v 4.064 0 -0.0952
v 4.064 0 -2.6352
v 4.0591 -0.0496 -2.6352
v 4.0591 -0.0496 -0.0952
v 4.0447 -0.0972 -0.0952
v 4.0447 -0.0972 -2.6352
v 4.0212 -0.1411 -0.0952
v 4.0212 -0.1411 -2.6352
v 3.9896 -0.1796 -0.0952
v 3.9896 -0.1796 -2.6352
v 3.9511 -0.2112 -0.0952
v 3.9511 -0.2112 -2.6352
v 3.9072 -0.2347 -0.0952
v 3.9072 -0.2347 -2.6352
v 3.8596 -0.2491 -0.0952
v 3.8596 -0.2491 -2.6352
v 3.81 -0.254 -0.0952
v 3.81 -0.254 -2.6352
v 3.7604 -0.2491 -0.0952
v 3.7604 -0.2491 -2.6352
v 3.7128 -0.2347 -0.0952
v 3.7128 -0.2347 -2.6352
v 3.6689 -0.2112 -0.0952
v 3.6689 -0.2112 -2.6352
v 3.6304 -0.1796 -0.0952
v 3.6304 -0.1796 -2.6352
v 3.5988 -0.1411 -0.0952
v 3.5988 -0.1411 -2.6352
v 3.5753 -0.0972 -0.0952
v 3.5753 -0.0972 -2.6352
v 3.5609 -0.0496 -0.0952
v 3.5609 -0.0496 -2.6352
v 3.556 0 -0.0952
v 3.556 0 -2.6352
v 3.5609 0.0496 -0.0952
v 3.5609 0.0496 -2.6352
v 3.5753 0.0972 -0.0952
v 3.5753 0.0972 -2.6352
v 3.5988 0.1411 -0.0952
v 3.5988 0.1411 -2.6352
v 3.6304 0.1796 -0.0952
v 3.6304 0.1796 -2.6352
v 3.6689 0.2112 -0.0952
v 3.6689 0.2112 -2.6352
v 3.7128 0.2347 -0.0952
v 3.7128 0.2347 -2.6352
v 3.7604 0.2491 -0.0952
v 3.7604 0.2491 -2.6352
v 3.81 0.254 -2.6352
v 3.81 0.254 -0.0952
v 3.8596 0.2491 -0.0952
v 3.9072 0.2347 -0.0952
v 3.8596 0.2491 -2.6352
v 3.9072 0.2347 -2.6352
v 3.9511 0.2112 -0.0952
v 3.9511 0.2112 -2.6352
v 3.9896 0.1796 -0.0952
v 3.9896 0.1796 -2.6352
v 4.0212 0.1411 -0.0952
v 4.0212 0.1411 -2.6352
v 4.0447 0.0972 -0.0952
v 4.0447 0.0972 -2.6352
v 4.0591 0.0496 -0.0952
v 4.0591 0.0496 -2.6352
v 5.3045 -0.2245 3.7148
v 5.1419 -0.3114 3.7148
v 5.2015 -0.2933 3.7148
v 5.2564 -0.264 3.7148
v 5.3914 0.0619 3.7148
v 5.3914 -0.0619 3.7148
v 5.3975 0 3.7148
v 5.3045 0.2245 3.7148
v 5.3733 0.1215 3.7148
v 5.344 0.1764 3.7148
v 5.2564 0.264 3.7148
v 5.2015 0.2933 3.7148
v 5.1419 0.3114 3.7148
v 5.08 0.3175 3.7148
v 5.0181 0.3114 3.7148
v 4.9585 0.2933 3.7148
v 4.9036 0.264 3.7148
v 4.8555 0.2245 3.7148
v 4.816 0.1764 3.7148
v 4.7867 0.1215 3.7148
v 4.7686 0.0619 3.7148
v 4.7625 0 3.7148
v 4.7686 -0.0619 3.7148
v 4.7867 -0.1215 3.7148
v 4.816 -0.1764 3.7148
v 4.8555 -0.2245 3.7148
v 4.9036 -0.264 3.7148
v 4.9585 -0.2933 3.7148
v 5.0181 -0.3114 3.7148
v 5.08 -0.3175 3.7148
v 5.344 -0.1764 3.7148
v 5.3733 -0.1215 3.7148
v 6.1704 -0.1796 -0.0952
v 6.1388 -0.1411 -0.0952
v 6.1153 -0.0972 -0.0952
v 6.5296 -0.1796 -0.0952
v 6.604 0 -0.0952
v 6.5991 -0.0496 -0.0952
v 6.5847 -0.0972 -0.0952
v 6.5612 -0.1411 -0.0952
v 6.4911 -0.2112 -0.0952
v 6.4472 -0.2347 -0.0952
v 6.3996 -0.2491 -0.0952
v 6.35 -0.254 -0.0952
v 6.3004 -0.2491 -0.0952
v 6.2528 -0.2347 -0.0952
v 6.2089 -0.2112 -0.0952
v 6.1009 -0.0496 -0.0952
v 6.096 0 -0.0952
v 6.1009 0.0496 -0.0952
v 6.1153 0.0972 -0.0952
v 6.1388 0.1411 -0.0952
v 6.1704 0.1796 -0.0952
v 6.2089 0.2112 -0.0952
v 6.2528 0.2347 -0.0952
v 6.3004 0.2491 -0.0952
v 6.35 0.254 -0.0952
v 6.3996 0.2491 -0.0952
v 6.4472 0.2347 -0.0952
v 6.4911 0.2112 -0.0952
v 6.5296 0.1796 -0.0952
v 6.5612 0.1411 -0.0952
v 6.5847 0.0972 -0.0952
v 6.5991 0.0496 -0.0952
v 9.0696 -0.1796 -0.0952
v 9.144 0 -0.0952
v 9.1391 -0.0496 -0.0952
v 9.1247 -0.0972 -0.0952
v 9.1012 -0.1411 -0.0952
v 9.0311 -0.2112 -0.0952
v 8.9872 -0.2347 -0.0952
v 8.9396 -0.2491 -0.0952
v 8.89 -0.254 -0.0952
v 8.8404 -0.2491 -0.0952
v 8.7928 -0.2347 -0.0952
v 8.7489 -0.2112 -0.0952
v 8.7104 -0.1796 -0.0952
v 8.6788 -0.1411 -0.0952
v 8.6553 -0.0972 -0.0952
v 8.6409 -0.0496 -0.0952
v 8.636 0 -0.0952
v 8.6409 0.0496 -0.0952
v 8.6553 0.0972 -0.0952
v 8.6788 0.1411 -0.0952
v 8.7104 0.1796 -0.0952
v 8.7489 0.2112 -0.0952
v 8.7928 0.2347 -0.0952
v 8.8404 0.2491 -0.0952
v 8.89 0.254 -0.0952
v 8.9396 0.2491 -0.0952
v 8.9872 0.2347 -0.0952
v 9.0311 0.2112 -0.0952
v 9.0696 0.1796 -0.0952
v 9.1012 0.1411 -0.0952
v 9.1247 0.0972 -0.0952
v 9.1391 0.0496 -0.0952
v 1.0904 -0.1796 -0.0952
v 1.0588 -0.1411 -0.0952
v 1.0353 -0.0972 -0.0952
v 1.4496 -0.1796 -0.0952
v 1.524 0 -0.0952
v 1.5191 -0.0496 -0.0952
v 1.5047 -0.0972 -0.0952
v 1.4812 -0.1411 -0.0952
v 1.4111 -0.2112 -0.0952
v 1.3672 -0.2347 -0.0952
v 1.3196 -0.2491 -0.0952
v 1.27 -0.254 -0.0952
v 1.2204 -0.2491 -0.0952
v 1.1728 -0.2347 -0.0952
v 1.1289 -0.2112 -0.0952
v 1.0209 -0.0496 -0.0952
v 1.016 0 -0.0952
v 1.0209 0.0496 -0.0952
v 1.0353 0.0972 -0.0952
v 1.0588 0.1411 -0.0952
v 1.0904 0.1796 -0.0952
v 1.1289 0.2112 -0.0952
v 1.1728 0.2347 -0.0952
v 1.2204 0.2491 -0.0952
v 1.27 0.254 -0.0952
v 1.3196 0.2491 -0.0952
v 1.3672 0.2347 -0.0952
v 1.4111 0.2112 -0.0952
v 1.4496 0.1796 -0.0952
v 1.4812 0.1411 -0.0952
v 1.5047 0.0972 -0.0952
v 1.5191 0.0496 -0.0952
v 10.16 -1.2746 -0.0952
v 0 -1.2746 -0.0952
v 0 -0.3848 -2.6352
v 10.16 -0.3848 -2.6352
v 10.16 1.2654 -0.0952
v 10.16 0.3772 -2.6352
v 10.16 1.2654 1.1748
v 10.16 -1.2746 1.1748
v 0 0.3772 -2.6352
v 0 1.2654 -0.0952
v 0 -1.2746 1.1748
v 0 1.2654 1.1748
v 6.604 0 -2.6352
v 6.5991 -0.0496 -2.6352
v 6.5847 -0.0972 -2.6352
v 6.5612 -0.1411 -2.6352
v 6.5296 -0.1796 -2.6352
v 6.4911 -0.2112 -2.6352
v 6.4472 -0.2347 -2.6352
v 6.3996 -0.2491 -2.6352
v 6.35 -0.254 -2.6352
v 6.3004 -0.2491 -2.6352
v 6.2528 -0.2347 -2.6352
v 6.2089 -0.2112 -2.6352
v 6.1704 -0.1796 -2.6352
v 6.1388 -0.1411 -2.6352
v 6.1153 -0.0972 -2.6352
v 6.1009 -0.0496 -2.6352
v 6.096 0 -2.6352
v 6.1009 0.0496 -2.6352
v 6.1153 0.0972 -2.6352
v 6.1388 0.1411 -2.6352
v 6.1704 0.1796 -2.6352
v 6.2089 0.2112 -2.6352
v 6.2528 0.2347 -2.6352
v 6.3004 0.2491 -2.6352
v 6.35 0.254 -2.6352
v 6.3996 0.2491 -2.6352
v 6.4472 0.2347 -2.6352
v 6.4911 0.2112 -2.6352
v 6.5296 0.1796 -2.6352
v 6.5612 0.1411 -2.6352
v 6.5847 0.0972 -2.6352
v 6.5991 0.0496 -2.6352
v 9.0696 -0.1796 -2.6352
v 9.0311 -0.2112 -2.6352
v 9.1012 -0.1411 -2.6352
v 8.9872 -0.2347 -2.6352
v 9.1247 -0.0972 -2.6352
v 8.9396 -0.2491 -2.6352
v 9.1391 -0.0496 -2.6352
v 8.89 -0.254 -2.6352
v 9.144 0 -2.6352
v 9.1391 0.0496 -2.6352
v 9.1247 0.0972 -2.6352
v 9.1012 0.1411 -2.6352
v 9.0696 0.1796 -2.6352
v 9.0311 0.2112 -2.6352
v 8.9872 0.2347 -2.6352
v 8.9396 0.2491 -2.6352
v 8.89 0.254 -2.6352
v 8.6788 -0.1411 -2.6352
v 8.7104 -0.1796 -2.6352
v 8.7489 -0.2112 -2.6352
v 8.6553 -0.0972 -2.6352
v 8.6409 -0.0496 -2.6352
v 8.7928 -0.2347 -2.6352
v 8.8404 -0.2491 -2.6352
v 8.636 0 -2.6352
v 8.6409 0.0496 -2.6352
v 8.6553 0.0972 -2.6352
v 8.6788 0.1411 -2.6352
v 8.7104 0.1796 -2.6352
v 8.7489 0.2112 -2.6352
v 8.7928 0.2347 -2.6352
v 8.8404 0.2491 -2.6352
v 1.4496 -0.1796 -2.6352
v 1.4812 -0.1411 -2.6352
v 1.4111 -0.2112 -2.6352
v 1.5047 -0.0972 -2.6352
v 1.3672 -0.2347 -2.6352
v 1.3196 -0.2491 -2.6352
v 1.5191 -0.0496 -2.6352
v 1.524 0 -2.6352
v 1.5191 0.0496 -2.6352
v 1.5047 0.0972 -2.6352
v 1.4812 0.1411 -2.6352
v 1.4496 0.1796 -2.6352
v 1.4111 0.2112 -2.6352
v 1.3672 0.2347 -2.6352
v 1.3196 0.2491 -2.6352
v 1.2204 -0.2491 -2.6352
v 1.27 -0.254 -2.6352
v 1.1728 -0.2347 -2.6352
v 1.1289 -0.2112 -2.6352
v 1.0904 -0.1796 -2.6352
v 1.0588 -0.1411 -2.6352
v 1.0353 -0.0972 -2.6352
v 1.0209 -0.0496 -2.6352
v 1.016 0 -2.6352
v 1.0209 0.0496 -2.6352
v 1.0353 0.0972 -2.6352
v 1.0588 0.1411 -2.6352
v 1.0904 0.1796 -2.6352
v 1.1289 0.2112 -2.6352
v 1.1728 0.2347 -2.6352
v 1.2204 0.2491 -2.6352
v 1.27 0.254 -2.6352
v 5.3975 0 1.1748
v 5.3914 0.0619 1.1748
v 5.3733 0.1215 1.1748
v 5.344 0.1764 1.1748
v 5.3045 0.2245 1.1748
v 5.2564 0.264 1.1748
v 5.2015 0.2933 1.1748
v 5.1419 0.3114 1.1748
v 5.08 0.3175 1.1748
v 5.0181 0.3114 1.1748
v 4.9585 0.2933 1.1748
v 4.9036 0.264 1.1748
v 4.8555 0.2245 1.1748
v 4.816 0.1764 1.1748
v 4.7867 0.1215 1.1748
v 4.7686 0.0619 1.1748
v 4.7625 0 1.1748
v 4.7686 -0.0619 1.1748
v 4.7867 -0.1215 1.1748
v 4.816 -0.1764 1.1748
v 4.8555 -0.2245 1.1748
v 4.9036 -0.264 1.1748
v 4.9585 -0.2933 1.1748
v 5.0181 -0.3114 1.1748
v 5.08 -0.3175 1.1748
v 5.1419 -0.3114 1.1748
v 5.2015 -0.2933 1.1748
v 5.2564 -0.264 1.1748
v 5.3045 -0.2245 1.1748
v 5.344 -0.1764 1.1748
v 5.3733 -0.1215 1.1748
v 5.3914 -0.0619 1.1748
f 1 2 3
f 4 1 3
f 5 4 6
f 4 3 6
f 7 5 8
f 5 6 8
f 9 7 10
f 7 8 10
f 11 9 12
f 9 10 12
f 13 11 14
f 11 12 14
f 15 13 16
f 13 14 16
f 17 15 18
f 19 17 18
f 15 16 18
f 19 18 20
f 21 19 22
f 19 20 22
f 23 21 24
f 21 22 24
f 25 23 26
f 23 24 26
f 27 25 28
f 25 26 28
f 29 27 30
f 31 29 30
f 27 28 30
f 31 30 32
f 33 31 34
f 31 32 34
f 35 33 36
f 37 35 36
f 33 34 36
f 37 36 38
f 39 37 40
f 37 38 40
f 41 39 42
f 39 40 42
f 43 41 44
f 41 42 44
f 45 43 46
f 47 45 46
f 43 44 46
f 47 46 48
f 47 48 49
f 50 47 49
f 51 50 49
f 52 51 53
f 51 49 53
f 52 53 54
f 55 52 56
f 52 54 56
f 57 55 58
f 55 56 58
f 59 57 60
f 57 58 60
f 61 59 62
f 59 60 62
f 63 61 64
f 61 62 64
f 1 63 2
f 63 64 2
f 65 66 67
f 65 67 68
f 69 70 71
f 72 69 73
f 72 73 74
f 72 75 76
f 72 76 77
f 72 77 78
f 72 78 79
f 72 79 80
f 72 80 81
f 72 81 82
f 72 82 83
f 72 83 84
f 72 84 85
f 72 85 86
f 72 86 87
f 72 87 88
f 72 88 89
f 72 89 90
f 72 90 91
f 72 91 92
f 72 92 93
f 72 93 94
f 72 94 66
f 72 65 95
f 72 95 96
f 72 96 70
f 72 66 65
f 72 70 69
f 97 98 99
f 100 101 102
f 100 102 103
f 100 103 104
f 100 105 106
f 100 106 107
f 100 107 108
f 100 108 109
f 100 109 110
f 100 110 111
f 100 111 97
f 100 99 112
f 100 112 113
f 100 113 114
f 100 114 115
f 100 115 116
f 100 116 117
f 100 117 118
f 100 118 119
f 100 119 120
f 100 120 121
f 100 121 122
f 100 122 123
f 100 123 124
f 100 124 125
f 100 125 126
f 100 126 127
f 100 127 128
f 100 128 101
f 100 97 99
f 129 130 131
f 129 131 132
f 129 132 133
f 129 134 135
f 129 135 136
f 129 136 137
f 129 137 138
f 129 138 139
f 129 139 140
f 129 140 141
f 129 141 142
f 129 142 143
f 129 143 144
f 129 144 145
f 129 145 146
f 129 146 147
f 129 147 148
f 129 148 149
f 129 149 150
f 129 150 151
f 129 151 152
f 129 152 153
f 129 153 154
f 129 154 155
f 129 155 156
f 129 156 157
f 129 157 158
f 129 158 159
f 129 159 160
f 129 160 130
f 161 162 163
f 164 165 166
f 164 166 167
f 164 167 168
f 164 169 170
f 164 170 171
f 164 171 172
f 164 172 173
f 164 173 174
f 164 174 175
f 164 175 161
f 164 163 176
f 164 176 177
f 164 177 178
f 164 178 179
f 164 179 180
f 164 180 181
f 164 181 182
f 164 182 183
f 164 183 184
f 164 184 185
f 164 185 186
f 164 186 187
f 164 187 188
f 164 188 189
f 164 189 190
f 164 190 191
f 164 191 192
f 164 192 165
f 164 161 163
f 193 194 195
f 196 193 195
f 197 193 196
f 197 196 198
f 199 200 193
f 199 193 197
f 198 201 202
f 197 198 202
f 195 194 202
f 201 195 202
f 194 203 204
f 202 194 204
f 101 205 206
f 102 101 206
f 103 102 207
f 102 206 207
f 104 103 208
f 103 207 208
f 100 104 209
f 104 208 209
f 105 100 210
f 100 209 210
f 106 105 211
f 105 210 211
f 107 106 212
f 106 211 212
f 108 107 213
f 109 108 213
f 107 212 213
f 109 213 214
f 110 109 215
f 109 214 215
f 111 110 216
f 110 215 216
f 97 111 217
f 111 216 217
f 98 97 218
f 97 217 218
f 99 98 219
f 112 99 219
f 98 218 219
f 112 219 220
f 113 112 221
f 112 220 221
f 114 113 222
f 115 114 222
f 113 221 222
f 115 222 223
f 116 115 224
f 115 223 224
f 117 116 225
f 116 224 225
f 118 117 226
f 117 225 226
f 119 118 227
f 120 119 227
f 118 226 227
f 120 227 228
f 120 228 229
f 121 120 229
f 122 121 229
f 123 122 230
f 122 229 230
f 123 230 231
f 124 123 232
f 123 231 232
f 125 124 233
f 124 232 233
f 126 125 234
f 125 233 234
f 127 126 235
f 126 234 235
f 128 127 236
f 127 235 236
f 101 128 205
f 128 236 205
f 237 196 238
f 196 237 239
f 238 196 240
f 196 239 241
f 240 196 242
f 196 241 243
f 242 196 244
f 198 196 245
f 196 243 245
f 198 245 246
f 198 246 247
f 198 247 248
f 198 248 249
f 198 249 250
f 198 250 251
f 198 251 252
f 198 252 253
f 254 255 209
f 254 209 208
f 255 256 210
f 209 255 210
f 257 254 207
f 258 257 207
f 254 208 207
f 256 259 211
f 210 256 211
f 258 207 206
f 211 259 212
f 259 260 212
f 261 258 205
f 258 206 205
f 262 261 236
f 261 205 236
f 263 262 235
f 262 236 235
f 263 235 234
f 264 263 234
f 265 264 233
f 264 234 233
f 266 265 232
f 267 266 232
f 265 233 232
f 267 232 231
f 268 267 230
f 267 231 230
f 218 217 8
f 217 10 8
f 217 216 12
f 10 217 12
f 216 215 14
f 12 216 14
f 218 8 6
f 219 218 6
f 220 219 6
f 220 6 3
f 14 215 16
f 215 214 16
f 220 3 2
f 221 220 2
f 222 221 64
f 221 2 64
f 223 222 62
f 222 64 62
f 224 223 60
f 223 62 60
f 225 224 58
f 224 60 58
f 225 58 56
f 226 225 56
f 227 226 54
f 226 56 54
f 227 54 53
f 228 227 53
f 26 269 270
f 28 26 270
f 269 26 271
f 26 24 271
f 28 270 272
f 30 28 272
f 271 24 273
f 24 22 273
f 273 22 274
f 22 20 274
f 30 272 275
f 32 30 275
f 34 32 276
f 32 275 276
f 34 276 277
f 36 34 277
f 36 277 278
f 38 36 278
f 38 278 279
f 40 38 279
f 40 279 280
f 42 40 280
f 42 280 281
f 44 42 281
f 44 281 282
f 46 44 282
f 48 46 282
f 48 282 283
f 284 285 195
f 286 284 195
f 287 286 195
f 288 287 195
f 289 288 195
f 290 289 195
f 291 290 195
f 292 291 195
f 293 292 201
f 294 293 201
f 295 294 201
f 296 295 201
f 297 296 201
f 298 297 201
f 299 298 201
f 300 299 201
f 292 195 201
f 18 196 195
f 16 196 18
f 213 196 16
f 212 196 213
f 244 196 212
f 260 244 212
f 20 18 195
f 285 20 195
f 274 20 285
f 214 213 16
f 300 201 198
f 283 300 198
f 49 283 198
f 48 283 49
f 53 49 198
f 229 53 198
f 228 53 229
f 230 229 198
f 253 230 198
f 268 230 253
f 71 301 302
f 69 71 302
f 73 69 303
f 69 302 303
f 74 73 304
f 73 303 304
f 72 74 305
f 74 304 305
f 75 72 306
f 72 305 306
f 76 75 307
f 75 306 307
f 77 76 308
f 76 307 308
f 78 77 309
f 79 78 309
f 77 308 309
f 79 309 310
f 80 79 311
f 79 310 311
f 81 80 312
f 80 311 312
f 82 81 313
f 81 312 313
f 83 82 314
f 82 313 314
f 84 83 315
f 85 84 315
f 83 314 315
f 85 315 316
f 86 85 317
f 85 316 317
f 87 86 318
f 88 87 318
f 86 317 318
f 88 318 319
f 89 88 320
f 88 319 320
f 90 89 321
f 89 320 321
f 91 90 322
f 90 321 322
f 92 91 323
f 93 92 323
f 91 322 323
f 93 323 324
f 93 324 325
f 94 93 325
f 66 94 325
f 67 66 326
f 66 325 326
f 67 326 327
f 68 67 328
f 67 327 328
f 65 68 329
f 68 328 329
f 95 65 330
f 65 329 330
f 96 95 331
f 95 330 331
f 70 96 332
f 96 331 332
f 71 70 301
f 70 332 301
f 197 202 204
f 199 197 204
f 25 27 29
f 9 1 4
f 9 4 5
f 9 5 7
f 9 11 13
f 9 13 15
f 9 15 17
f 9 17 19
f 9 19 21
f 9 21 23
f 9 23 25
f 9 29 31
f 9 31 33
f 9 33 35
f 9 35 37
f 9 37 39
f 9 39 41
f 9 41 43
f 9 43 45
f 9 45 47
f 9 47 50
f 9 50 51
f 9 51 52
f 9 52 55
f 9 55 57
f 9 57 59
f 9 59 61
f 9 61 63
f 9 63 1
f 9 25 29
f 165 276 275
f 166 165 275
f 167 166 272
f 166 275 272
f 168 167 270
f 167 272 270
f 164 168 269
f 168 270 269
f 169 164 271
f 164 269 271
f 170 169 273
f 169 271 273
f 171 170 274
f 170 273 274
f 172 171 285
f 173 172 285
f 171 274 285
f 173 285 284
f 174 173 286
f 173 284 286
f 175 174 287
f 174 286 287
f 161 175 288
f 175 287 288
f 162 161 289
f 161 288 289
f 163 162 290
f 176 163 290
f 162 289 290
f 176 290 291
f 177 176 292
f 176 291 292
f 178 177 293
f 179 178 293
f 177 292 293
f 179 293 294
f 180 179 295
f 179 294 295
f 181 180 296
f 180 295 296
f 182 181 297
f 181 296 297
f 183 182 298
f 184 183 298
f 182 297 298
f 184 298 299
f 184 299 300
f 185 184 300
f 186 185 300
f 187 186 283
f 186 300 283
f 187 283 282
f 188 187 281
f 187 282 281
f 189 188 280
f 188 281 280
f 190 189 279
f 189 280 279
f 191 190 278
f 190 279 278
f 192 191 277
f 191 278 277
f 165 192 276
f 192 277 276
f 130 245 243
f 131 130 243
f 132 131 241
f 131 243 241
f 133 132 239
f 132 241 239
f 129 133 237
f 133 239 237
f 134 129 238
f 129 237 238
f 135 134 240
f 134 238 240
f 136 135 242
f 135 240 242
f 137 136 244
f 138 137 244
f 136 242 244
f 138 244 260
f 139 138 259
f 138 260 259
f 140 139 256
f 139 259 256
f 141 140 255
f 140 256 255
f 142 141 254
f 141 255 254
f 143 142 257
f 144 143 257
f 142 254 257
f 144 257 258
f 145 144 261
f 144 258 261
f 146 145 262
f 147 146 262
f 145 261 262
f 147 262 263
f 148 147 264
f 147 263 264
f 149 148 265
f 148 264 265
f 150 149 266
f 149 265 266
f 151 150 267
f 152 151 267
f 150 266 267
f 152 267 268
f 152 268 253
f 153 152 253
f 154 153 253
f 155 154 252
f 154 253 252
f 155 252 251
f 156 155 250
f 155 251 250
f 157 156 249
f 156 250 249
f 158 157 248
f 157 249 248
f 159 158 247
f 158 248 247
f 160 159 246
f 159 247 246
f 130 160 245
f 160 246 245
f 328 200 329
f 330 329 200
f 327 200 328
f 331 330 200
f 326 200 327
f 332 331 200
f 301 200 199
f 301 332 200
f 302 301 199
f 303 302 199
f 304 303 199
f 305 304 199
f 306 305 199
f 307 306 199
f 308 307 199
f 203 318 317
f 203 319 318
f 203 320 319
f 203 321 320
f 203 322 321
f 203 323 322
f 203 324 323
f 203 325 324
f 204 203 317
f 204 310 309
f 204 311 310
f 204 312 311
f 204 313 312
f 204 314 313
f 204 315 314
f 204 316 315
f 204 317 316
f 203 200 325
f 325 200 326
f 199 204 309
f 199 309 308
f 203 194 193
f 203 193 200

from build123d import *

# Parameters (mm, degrees)
F0_W      = 2.54
F0_H      = 1.27
F1_DEPTH  = 10.16
F2_R      = 0.254
F3_DEPTH  = 2.54
F4_R      = 0.3175
F5_DEPTH  = 2.54
F6_R      = 0.254
F7_DEPTH  = 2.54
F8_R      = 0.254
F9_DEPTH  = 2.54
F10_R     = 0.254
F11_DEPTH = 2.54


with BuildPart() as f1:
    # F0 (on Right) → F1 (new body)
    with BuildSketch(Plane.YZ):
        with Locations((-0.004628, 0.539757)):
            Rectangle(F0_W, F0_H)
        Polygon((1.265372, -0.095243), (-1.274628, -0.095243), (-0.384839, -2.635243), (0.377161, -2.635243), align=None)
    extrude(amount=F1_DEPTH)

    # F2 (on face) → F3 (cut)
    with BuildSketch(Plane(origin=(0, 0, -2.635243), x_dir=(1, 0, 0), z_dir=(0, 0, -1))):
        with Locations((1.27, 0)):
            Circle(F2_R)
    extrude(amount=-F3_DEPTH, mode=Mode.SUBTRACT)

    # F4 (on face) → F5 (join)
    with BuildSketch(Plane.XY.offset(1.174757)):
        with Locations((5.08, 0)):
            Circle(F4_R)
    extrude(amount=F5_DEPTH)

    # F6 (on face) → F7 (cut)
    with BuildSketch(Plane(origin=(0, 0, -2.635243), x_dir=(1, 0, 0), z_dir=(0, 0, -1))):
        with Locations((8.89, 0)):
            Circle(F6_R)
    extrude(amount=-F7_DEPTH, mode=Mode.SUBTRACT)

    # F8 (on face) → F9 (cut)
    with BuildSketch(Plane(origin=(0, 0, -2.635243), x_dir=(1, 0, 0), z_dir=(0, 0, -1))):
        with Locations((3.81, 0)):
            Circle(F8_R)
    extrude(amount=-F9_DEPTH, mode=Mode.SUBTRACT)

    # F10 (on face) → F11 (cut)
    with BuildSketch(Plane(origin=(0, 0, -2.635243), x_dir=(1, 0, 0), z_dir=(0, 0, -1))):
        with Locations((6.35, 0)):
            Circle(F10_R)
    extrude(amount=-F11_DEPTH, mode=Mode.SUBTRACT)


solid = f1.part
